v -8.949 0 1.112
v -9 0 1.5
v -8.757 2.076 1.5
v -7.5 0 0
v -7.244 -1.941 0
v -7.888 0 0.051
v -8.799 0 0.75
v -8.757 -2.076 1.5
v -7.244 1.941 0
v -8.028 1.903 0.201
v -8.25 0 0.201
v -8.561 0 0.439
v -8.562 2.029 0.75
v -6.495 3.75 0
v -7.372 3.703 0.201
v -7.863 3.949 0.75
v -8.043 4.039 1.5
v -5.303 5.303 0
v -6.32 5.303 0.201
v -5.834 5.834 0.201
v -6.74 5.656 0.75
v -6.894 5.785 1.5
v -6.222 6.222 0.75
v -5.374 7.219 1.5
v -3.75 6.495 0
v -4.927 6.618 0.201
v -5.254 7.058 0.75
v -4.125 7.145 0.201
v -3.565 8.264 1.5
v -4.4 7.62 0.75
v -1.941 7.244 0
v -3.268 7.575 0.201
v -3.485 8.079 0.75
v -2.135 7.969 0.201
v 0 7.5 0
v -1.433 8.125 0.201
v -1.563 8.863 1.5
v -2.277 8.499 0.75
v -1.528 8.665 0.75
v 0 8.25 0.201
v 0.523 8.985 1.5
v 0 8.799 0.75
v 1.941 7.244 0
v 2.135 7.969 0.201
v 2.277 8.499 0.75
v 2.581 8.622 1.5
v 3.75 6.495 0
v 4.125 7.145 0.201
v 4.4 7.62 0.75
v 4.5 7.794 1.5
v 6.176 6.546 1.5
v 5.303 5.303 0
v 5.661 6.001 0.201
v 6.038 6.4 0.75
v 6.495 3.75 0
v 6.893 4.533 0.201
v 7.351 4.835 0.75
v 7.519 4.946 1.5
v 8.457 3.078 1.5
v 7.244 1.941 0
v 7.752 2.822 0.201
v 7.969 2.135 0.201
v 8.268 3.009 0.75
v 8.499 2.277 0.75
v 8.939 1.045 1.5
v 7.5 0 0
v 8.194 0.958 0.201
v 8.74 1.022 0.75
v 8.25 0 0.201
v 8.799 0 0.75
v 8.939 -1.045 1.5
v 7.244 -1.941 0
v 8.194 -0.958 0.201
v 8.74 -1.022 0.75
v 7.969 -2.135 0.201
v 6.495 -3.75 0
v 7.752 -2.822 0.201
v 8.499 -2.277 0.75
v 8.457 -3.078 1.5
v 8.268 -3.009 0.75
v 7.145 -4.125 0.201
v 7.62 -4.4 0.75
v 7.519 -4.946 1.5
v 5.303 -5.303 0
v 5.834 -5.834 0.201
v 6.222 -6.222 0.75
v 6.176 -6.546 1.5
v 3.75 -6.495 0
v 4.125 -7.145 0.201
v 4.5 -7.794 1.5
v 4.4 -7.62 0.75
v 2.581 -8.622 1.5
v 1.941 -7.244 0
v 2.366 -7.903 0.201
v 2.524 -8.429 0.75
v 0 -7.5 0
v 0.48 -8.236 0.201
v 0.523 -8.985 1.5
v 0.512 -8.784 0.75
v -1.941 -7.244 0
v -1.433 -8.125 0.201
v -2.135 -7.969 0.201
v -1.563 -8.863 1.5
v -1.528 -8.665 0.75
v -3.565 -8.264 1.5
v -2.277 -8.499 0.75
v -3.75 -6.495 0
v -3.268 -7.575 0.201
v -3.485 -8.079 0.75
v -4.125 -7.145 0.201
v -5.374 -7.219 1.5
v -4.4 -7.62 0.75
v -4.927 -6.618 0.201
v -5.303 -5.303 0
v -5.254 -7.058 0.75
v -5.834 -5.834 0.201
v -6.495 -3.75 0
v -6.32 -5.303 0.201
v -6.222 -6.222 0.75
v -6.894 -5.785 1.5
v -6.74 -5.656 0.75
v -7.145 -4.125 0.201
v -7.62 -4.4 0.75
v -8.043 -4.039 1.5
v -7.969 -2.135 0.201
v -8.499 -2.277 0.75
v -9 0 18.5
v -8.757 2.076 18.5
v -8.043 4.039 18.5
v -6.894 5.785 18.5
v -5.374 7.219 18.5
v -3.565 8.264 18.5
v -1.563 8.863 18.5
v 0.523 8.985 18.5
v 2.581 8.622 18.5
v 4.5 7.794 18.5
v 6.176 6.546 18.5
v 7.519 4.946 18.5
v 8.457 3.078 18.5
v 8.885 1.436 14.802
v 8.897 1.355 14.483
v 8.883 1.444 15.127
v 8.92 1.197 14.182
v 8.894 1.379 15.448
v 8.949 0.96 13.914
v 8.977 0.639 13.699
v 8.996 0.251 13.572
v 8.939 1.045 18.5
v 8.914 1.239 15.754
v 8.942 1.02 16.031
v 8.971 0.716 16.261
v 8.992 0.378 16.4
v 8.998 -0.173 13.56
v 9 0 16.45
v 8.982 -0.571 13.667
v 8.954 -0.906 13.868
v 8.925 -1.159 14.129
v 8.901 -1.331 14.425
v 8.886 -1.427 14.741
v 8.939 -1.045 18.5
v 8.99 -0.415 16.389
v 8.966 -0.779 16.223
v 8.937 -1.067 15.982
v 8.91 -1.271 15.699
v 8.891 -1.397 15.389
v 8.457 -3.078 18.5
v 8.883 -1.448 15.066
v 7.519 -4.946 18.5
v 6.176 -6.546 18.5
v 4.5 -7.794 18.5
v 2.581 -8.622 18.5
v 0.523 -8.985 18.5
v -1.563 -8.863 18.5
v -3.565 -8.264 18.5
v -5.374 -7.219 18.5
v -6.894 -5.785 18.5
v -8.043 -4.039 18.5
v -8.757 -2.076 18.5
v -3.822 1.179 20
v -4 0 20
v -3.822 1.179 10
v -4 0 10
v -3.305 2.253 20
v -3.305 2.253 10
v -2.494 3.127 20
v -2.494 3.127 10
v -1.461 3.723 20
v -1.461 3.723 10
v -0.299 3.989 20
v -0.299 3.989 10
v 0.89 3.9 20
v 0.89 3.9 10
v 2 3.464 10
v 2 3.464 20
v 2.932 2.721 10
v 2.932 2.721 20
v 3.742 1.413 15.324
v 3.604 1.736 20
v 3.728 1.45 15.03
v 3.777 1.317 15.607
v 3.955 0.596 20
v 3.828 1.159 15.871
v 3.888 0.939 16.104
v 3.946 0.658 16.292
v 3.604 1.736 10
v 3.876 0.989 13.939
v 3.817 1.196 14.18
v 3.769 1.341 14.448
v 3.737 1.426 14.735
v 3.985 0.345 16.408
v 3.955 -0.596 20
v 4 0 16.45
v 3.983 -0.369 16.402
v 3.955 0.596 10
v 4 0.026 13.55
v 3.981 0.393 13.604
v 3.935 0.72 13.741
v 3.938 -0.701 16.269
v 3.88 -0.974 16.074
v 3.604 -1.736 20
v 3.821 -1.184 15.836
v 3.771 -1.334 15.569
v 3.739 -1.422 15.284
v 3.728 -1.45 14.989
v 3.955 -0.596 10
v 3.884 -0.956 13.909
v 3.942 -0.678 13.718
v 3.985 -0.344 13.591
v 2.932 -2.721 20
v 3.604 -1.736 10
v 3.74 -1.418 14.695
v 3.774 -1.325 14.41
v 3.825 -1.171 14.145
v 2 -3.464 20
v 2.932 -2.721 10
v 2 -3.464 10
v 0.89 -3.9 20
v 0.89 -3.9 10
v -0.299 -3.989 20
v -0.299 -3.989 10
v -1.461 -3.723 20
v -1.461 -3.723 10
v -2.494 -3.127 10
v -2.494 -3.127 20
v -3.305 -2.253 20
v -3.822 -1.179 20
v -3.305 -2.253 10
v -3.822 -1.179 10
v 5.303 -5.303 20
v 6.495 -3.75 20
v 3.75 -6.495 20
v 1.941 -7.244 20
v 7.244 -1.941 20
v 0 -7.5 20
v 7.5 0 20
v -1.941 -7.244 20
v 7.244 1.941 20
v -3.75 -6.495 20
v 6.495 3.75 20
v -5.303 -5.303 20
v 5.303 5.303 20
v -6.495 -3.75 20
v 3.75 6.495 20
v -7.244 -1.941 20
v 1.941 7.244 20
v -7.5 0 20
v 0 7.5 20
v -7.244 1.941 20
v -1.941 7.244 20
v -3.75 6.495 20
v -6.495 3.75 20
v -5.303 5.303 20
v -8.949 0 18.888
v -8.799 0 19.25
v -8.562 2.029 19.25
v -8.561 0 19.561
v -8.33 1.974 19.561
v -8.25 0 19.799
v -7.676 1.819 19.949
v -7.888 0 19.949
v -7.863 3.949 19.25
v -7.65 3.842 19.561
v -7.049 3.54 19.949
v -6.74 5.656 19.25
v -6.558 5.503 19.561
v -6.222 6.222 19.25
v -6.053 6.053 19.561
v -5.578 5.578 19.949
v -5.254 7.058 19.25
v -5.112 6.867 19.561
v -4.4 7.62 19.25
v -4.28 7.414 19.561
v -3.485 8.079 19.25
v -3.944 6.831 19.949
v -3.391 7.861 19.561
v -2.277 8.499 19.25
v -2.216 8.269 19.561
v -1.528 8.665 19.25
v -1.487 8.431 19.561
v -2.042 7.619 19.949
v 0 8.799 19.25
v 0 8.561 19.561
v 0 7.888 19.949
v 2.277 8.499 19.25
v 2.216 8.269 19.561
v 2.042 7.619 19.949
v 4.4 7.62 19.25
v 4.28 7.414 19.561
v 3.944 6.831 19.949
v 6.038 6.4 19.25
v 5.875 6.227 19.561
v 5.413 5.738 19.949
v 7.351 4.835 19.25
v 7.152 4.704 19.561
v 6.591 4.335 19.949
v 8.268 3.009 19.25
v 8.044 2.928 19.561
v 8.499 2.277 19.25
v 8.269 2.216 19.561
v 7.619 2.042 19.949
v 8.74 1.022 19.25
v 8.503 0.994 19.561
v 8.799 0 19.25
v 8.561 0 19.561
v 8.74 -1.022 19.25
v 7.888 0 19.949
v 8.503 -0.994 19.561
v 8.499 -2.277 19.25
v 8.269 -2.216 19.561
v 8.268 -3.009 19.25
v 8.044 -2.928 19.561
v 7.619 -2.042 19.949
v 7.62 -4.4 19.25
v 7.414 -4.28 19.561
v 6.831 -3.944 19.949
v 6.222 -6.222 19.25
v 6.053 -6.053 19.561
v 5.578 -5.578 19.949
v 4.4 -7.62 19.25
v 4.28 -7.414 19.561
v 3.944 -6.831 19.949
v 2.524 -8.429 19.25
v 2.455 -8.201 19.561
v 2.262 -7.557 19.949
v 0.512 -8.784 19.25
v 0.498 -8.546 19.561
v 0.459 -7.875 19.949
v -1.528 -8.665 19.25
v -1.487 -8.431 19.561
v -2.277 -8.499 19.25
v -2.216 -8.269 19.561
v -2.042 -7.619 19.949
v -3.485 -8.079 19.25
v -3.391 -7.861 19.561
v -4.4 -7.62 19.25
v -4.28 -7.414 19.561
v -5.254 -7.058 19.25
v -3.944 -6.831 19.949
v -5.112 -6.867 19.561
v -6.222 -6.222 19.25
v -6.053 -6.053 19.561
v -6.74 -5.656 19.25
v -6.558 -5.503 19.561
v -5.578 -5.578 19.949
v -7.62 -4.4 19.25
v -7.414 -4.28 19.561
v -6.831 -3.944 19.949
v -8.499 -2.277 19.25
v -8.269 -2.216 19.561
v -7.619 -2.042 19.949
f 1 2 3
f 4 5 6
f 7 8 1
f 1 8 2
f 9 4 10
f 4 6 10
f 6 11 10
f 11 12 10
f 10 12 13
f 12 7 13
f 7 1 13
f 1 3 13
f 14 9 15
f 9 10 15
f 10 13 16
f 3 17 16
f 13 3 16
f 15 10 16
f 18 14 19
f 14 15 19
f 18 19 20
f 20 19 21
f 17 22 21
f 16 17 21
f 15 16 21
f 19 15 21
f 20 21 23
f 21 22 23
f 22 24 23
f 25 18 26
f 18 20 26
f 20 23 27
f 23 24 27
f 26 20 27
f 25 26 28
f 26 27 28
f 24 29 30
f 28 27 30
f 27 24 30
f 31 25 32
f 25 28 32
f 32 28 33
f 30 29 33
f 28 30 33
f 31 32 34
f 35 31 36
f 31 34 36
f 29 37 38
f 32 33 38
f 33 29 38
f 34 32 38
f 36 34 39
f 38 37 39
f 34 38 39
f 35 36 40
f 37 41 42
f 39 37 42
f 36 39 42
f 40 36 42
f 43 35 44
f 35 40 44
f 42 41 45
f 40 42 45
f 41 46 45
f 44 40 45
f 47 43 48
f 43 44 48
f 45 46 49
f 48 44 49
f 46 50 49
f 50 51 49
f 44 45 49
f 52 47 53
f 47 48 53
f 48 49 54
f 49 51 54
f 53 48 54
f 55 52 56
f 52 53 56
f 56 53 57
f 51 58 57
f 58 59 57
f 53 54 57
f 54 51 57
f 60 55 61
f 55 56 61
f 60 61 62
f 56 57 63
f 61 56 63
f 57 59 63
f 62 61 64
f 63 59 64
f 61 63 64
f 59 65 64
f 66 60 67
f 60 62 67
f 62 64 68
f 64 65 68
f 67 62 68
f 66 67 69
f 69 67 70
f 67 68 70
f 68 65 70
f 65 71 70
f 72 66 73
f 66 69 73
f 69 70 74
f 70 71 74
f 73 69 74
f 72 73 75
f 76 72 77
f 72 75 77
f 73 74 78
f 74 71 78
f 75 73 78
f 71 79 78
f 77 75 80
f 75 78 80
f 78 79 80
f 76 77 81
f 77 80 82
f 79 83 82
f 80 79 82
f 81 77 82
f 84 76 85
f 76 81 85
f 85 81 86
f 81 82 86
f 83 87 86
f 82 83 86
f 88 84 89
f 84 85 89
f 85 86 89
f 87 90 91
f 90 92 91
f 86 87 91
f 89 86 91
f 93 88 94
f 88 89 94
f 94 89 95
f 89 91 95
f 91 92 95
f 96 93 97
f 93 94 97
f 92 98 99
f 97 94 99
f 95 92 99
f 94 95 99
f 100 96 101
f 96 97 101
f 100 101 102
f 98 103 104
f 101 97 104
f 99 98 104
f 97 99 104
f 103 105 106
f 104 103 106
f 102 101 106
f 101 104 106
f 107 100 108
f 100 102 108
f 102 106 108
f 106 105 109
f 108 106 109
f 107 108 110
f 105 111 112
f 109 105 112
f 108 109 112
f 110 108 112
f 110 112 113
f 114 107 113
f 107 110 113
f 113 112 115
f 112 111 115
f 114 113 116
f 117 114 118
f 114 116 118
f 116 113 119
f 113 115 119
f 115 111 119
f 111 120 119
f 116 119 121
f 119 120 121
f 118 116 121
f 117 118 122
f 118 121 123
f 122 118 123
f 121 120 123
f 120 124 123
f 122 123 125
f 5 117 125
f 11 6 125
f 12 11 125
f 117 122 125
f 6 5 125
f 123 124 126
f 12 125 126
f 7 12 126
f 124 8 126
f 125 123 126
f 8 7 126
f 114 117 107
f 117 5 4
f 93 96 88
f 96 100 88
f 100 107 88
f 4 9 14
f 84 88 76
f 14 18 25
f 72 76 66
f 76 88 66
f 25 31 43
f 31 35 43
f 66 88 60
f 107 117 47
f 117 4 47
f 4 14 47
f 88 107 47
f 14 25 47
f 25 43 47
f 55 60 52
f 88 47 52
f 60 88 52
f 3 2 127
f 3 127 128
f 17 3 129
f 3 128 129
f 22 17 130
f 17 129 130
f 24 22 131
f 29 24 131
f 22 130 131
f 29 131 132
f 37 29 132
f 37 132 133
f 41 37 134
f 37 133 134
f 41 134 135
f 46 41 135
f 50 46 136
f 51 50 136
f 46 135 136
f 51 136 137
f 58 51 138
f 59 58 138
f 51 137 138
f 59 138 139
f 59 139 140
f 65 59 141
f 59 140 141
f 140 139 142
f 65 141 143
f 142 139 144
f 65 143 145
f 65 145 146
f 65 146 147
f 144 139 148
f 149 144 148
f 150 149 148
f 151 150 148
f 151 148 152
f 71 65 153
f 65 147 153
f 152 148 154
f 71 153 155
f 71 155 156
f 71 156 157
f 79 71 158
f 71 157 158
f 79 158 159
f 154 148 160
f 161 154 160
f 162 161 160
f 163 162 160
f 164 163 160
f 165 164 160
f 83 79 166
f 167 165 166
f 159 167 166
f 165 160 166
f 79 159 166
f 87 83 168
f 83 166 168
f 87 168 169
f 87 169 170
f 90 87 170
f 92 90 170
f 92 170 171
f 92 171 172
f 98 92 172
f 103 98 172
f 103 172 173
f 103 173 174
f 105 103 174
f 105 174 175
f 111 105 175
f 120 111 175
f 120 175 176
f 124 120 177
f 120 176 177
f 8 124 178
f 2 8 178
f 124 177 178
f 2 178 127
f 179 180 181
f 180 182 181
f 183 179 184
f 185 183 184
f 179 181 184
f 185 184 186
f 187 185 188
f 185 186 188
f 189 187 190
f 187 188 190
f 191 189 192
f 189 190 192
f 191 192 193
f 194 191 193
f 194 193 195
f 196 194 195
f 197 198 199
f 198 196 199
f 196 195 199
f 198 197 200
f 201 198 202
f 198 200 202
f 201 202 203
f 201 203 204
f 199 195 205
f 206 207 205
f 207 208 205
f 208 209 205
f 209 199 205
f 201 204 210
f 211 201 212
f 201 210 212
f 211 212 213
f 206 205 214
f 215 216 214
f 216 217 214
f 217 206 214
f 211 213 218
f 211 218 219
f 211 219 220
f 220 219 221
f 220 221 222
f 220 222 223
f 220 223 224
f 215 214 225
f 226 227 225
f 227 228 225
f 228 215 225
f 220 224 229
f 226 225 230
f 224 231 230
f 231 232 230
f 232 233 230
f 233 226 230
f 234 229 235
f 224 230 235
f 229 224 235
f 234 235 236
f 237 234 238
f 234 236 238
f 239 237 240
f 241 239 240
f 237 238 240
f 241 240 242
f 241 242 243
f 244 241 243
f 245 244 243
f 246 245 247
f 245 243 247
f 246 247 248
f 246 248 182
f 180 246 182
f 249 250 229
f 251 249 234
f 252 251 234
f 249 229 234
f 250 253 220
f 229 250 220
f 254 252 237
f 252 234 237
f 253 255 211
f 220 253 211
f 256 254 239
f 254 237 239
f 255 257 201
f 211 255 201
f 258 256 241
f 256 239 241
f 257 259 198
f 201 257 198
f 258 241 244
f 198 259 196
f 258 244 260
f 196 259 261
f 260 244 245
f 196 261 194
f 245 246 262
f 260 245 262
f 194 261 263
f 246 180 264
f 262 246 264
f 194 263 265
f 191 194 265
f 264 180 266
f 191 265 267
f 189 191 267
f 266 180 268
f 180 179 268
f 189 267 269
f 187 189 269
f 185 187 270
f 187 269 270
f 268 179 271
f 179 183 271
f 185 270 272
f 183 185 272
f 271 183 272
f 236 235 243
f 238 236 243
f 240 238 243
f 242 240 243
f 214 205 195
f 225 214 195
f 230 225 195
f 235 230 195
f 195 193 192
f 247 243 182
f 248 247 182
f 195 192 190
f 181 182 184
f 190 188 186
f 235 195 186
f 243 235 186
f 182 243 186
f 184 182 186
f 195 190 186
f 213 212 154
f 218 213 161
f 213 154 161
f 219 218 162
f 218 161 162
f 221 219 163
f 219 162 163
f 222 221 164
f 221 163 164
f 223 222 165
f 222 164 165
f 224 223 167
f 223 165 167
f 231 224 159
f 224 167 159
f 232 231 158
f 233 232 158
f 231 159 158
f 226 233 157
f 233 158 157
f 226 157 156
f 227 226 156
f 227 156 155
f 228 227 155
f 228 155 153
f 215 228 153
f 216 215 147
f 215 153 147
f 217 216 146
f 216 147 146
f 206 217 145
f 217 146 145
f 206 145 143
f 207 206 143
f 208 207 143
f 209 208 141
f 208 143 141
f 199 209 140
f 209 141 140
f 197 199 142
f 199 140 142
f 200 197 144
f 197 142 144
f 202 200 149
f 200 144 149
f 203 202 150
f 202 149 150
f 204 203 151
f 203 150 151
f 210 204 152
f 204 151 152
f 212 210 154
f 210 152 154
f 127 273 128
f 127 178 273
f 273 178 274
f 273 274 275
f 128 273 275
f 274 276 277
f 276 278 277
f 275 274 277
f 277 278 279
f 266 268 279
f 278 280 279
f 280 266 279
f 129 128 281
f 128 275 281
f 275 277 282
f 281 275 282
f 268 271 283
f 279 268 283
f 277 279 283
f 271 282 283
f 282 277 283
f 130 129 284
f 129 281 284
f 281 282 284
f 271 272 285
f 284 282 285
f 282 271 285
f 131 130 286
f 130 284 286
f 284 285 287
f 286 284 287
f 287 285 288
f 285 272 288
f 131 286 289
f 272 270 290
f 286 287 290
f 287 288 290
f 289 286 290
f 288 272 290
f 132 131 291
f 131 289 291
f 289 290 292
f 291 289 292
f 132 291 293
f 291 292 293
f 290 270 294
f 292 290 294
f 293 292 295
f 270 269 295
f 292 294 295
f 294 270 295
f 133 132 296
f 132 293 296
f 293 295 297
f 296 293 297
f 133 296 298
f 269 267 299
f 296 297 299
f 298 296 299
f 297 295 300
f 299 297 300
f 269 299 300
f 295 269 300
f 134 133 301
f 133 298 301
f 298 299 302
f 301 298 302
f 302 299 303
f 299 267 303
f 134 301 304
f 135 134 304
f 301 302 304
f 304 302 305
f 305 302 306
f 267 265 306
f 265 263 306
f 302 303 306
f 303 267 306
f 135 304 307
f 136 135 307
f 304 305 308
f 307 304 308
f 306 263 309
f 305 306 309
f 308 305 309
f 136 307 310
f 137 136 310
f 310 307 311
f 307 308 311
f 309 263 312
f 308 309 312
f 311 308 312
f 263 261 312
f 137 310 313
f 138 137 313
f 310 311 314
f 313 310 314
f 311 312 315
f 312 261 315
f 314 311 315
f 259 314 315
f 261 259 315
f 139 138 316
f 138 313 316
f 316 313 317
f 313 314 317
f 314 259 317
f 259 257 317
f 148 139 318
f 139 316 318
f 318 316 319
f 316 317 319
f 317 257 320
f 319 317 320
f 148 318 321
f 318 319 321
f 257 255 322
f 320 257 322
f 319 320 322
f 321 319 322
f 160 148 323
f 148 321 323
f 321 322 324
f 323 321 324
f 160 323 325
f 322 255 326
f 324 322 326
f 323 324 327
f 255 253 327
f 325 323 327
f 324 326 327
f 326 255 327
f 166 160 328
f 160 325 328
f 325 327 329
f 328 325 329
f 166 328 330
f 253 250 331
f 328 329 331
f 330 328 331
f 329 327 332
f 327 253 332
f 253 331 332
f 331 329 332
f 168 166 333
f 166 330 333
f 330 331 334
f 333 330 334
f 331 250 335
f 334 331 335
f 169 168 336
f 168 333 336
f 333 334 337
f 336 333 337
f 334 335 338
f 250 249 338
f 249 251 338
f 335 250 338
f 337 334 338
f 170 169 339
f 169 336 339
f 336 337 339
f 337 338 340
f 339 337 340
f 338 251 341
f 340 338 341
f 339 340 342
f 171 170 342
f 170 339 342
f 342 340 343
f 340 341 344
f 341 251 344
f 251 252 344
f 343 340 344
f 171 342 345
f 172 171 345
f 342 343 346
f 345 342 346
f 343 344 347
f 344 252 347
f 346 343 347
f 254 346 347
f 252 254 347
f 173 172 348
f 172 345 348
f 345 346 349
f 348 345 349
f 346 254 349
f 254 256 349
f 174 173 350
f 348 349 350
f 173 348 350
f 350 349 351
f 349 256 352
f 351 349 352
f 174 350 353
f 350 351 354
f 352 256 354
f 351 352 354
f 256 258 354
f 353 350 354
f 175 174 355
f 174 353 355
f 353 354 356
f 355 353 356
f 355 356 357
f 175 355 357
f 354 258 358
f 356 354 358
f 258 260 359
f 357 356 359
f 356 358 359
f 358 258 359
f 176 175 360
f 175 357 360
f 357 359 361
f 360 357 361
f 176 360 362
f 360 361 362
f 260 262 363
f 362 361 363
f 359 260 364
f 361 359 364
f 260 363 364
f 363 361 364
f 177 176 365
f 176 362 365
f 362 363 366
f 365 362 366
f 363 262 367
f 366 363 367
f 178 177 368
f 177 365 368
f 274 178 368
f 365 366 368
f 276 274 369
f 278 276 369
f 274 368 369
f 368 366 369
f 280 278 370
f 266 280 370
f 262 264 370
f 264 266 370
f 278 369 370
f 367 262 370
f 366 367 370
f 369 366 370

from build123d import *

# Parameters (mm, degrees)
F_8_0_8_DIAMETER_HOLE1_D     = 8
F_8_0_8_DIAMETER_HOLE1_DEPTH = 10
SKETCH4_W                    = 1.45
SKETCH4_H                    = 18


with BuildPart() as part:
    # Sketch1 → Revolve1 (revolve)
    with BuildSketch(Plane.XZ, mode=Mode.PRIVATE) as revolve1_sk:
        with BuildLine():
            Line((7.5, 20), (0, 20))
            Line((0, 20), (0, 0))
            Line((0, 0), (7.5, 0))
            ThreePointArc((7.5, 0), (8.560660172, 0.439339828), (9, 1.5))
            Line((9, 1.5), (9, 18.5))
            ThreePointArc((9, 18.5), (8.560660172, 19.560660172), (7.5, 20))
        make_face()
    revolve(revolve1_sk.sketch.rotate(Axis((0, 0, 20), (0, 0, -1)), 180), axis=Axis((0, 0, 20), (0, 0, -1)))

    # Ø8.0 (8) Diameter Hole1
    with Locations(Plane.XY.offset(20)):
        with Locations((0, 0)):
            Hole(F_8_0_8_DIAMETER_HOLE1_D / 2, depth=F_8_0_8_DIAMETER_HOLE1_DEPTH)

    # Sketch4 → Ø2.9 (2.9) Diameter Hole1 (revolve, cut)
    with BuildSketch(Plane(origin=(3.727935085, 0, 15), x_dir=(0, 0, 1), z_dir=(0, 1, 0))):
        with Locations((0.725, 9)):
            Rectangle(SKETCH4_W, SKETCH4_H)
    revolve(axis=Axis((-2.622064915, 0, 15), (1, 0, 0)), mode=Mode.SUBTRACT)


solid = part.part
